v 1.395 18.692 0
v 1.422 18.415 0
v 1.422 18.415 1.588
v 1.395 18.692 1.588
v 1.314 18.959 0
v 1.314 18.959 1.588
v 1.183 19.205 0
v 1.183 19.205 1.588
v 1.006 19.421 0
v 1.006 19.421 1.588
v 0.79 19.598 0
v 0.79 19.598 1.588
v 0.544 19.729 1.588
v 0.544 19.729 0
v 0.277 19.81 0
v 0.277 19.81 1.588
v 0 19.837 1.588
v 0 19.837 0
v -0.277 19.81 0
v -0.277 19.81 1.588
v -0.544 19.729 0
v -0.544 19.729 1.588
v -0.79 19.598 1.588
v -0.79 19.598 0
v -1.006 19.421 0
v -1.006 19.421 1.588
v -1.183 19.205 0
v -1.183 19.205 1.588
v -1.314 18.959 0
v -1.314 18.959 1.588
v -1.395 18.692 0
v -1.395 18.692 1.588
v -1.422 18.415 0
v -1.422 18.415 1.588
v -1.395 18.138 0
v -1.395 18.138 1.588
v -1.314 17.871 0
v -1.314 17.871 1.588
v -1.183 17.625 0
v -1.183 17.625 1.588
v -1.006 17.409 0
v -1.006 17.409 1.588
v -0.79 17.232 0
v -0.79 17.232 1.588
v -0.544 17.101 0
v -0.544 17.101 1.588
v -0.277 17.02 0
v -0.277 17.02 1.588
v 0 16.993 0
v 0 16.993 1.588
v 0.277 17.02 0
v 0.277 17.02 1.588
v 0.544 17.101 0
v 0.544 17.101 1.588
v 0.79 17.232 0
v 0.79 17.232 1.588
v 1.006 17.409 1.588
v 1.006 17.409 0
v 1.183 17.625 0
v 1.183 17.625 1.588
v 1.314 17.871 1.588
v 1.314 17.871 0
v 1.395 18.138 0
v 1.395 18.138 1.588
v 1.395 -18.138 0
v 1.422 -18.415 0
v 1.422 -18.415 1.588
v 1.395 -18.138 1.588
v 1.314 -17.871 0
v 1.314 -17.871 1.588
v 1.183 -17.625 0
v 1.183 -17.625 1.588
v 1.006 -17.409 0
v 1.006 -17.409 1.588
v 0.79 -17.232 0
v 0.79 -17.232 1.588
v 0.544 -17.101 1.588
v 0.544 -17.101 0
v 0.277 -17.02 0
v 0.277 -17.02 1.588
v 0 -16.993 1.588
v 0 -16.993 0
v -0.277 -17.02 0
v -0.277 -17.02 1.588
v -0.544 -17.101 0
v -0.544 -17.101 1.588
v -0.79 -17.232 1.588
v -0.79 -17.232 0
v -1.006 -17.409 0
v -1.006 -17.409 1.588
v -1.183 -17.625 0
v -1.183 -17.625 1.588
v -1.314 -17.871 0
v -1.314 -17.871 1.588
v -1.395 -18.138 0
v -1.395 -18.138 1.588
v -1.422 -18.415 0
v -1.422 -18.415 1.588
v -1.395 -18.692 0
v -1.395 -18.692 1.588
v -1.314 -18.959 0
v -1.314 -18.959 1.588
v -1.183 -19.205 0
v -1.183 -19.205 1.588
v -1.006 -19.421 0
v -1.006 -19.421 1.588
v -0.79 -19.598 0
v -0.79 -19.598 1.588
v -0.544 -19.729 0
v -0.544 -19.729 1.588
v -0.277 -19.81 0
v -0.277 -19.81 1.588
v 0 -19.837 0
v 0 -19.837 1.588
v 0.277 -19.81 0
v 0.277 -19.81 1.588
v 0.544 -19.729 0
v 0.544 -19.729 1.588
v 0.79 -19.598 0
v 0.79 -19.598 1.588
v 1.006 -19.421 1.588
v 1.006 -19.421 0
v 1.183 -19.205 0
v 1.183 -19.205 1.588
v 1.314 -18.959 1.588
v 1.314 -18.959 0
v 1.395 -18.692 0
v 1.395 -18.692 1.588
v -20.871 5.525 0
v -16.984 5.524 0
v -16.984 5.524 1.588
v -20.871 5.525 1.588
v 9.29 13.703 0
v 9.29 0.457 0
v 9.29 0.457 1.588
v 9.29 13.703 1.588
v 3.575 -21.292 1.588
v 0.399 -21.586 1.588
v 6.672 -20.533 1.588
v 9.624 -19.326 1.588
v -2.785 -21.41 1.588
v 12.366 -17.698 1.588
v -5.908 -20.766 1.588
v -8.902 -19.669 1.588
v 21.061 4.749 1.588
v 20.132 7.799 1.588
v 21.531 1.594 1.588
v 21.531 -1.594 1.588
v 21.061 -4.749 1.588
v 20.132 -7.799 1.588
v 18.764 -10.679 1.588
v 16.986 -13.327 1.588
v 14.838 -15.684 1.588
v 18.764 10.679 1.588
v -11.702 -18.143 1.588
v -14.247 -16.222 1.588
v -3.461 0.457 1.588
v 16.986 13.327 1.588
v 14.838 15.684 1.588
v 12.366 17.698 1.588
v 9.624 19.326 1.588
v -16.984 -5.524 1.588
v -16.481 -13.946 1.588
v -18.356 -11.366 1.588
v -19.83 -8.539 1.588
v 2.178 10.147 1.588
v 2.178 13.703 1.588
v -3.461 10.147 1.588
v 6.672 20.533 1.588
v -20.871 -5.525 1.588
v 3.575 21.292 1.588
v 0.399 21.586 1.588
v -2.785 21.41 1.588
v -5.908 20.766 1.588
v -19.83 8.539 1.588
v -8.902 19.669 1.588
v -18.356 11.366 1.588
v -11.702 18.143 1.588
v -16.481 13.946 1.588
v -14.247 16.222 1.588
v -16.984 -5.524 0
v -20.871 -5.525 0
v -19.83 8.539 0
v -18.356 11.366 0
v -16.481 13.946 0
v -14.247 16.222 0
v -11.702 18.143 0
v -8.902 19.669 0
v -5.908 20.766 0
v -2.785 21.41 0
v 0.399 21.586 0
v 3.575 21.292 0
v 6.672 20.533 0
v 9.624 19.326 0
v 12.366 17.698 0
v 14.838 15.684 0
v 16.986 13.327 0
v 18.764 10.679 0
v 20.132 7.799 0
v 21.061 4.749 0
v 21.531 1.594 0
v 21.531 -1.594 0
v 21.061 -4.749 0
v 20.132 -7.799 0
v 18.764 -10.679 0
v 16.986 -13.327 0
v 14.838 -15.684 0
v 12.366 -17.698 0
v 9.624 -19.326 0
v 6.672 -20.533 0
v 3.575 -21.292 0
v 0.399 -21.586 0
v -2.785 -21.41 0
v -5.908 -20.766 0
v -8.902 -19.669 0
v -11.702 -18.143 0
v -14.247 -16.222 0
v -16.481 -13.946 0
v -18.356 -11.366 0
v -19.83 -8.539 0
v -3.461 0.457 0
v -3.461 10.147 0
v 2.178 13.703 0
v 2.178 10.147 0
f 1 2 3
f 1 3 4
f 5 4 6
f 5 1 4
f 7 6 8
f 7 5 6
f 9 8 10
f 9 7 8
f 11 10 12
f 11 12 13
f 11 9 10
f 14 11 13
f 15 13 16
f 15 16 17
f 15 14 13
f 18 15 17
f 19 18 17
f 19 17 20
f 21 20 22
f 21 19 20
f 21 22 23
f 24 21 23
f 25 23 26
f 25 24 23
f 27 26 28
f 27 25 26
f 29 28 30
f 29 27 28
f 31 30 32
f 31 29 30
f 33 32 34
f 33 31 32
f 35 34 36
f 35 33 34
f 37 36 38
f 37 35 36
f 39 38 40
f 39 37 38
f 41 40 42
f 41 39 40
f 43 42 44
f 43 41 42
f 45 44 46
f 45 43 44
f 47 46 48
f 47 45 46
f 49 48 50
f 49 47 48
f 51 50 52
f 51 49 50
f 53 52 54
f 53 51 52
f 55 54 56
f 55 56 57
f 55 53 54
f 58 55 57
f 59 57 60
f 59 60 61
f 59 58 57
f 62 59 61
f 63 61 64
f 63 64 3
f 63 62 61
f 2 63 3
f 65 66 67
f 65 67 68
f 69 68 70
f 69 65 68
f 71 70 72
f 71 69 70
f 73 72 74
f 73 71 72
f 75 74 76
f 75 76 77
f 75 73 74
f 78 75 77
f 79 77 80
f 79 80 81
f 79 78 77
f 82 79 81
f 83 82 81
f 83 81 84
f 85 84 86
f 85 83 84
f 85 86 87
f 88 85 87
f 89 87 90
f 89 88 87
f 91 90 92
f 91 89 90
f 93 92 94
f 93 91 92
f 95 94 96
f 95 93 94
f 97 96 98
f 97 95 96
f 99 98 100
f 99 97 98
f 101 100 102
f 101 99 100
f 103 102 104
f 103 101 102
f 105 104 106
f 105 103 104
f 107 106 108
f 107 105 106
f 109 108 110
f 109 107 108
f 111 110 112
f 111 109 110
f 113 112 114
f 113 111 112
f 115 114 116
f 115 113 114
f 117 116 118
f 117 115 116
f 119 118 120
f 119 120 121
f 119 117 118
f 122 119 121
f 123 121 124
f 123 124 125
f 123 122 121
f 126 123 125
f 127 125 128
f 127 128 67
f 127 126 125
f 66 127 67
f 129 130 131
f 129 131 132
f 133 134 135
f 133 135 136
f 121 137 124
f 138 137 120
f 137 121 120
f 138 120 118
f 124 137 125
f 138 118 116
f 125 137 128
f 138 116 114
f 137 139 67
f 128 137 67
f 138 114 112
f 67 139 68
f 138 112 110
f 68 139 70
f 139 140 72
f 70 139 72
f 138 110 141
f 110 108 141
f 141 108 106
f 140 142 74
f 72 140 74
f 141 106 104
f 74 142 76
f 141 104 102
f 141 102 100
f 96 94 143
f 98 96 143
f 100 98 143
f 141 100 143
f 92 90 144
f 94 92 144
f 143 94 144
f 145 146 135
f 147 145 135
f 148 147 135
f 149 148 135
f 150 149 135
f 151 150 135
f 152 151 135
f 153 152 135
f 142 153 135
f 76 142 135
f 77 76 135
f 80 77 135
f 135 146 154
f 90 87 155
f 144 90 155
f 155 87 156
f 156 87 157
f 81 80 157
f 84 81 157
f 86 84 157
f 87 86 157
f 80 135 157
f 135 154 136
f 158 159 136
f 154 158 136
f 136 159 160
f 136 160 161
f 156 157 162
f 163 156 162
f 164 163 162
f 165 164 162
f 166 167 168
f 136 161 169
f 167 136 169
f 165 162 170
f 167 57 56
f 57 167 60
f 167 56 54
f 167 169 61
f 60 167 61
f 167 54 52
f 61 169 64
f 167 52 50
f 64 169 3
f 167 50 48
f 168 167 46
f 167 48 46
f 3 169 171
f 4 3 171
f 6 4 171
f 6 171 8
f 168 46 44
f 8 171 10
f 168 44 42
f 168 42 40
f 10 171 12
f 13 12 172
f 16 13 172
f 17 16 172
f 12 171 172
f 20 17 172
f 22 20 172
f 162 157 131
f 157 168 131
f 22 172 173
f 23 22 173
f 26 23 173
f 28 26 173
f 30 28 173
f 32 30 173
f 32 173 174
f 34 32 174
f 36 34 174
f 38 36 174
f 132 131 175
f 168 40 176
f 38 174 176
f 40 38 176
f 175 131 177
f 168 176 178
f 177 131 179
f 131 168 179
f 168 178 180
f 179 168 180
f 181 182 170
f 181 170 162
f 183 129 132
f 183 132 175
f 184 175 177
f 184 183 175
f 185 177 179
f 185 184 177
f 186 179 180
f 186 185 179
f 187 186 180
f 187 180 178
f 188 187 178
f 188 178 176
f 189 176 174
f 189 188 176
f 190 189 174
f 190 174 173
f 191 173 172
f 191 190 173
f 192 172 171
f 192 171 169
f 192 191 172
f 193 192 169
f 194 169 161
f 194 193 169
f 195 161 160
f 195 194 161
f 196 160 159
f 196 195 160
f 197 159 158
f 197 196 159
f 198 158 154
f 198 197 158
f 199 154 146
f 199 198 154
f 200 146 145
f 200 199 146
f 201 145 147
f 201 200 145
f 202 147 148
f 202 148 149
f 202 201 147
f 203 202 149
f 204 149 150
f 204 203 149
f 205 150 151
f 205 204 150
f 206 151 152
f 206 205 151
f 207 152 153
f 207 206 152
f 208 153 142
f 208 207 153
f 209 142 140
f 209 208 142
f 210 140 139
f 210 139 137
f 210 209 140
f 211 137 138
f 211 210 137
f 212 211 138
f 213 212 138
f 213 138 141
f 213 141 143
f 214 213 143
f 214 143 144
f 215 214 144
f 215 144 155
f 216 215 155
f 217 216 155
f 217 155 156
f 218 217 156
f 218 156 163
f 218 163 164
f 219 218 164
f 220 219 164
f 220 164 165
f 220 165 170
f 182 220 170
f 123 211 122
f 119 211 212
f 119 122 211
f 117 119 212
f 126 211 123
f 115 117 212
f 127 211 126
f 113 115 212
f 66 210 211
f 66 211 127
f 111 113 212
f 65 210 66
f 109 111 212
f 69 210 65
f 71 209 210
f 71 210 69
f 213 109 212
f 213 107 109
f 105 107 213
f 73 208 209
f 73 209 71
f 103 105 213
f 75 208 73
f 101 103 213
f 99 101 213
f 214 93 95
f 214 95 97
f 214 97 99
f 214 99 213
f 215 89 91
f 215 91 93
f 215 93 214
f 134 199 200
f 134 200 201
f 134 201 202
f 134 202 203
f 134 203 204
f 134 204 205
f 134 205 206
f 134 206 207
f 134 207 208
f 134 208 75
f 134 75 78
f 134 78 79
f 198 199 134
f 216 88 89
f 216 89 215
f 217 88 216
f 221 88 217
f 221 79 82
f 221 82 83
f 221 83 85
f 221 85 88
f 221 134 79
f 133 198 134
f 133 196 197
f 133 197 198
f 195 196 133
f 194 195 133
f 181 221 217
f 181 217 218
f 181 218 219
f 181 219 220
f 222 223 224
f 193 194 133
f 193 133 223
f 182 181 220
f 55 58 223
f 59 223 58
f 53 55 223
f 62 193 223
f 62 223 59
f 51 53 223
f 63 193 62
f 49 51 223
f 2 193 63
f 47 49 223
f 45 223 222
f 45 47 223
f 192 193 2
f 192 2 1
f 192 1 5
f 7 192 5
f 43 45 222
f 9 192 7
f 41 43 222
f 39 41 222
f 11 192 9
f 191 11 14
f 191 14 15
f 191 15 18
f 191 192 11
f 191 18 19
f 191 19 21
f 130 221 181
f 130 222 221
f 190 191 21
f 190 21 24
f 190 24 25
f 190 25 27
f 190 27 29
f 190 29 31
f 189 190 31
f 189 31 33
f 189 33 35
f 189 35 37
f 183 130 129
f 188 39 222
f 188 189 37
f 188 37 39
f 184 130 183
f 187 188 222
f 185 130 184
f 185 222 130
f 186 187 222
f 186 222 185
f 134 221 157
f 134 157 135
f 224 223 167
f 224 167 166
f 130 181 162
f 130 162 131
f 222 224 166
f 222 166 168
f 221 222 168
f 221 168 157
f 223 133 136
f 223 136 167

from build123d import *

# Parameters (mm, degrees)
SKETCH1_R           = 1.4224
BOSS_EXTRUDE1_DEPTH = 1.5875


with BuildPart() as part:
    # Sketch1 → Boss-Extrude1 (new body)
    with BuildSketch(Plane.XY):
        with BuildLine():
            Line((-16.984058744, 5.5245), (-20.871224203, 5.5245))
            ThreePointArc((-20.871224203, 5.5245), (21.59, 0), (-20.871224203, -5.5245))
            Line((-20.871224203, -5.5245), (-16.984058744, -5.5245))
            Line((-16.984058744, -5.5245), (-16.984058744, 5.5245))
        make_face()
        with Locations((0, 18.415)):
            Circle(SKETCH1_R, mode=Mode.SUBTRACT)
        with Locations((0, -18.415)):
            Circle(SKETCH1_R, mode=Mode.SUBTRACT)
        Polygon((9.29005, 13.7033), (2.17805, 13.7033), (2.17805, 10.1473), (-3.46075, 10.1473), (-3.46075, 0.4572), (9.29005, 0.4572), align=None, mode=Mode.SUBTRACT)
    extrude(amount=BOSS_EXTRUDE1_DEPTH)


solid = part.part
